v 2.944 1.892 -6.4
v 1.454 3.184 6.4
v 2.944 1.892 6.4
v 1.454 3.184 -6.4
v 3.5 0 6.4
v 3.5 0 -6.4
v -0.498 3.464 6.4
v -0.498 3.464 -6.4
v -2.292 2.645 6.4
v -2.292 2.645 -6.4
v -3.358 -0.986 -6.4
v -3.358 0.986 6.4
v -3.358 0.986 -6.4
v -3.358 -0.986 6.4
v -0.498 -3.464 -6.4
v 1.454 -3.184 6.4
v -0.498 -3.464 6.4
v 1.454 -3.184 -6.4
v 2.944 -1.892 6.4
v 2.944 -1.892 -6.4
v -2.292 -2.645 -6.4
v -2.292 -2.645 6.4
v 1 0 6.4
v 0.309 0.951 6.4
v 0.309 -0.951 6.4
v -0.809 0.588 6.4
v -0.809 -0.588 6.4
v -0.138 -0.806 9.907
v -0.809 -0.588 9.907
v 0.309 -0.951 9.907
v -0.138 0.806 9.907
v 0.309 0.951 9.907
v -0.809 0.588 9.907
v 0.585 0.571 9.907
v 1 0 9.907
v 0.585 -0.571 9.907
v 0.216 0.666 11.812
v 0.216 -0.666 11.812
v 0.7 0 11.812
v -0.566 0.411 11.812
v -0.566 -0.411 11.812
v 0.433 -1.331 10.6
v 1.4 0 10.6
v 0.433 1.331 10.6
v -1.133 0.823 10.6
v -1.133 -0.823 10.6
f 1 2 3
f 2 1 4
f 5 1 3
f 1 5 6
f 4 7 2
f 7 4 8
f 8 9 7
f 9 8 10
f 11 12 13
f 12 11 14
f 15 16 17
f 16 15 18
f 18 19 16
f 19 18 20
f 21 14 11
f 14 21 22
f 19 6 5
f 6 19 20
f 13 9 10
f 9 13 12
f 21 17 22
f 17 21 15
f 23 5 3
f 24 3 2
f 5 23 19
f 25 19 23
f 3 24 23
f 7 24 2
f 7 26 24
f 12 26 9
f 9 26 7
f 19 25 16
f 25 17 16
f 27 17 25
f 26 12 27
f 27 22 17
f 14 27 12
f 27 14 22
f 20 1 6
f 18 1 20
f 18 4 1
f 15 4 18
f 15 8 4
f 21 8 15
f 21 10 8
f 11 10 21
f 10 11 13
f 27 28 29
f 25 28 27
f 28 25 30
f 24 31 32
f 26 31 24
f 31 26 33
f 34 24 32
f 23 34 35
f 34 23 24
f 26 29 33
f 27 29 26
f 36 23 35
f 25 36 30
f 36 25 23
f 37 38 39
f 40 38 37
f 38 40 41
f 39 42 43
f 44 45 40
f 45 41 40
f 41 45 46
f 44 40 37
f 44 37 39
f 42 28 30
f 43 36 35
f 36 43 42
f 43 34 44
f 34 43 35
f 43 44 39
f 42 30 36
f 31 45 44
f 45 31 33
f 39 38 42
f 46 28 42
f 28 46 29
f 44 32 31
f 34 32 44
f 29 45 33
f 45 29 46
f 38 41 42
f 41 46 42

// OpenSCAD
// Parameters
body_diameter_mm = 7.0; //[3.5:14.0:0.1]
body_radius_mm = 3.5; //[1.75:7.0:0.1]
overall_height_mm = 13.6; //[6.8:27.2:0.1]
face_thickness_mm = 0.8; //[0.4:1.6:0.1]
toggle_shaft_radius_mm = 1.0; //[0.5:2.0:0.1]
toggle_shaft_height_mm = 5.0; //[2.5:10.0:0.1]
toggle_tip_radius_mm = 1.4; //[0.7:2.8:0.1]
overlap_mm = 0.8; //[0.2:2.0:0.1]

// Toggle - complete geometry
module toggle() {
  union() {
    // Toggle Shaft
    color("Silver") translate([0, 0, (overall_height_mm - face_thickness_mm) / 2 + toggle_shaft_height_mm / 2 - overlap_mm])
      cylinder(r=toggle_shaft_radius_mm, h=toggle_shaft_height_mm, center=true);
    
    // Toggle Tip
    color("Silver") translate([0, 0, (overall_height_mm - face_thickness_mm) / 2 + toggle_shaft_height_mm - overlap_mm])
      sphere(r=toggle_tip_radius_mm);
  }
}

// Switch Body with Faces
module switch_body_with_faces() {
  union() {
    // Cylindrical Body
    color("DimGray") translate([0, 0, 0])
      cylinder(r=body_radius_mm, h=overall_height_mm - 2 * face_thickness_mm, center=true);
    
    // Top Face
    translate([0, 0, (overall_height_mm - face_thickness_mm) / 2 - overlap_mm / 2])
      cylinder(r=body_radius_mm, h=face_thickness_mm, center=true);
    
    // Bottom Face
    translate([0, 0, -(overall_height_mm - face_thickness_mm) / 2 + overlap_mm / 2])
      cylinder(r=body_radius_mm, h=face_thickness_mm, center=true);
  }
}

// Assembly
module assembly() {
  union() {
    switch_body_with_faces();
    toggle();
  }
}

assembly();
